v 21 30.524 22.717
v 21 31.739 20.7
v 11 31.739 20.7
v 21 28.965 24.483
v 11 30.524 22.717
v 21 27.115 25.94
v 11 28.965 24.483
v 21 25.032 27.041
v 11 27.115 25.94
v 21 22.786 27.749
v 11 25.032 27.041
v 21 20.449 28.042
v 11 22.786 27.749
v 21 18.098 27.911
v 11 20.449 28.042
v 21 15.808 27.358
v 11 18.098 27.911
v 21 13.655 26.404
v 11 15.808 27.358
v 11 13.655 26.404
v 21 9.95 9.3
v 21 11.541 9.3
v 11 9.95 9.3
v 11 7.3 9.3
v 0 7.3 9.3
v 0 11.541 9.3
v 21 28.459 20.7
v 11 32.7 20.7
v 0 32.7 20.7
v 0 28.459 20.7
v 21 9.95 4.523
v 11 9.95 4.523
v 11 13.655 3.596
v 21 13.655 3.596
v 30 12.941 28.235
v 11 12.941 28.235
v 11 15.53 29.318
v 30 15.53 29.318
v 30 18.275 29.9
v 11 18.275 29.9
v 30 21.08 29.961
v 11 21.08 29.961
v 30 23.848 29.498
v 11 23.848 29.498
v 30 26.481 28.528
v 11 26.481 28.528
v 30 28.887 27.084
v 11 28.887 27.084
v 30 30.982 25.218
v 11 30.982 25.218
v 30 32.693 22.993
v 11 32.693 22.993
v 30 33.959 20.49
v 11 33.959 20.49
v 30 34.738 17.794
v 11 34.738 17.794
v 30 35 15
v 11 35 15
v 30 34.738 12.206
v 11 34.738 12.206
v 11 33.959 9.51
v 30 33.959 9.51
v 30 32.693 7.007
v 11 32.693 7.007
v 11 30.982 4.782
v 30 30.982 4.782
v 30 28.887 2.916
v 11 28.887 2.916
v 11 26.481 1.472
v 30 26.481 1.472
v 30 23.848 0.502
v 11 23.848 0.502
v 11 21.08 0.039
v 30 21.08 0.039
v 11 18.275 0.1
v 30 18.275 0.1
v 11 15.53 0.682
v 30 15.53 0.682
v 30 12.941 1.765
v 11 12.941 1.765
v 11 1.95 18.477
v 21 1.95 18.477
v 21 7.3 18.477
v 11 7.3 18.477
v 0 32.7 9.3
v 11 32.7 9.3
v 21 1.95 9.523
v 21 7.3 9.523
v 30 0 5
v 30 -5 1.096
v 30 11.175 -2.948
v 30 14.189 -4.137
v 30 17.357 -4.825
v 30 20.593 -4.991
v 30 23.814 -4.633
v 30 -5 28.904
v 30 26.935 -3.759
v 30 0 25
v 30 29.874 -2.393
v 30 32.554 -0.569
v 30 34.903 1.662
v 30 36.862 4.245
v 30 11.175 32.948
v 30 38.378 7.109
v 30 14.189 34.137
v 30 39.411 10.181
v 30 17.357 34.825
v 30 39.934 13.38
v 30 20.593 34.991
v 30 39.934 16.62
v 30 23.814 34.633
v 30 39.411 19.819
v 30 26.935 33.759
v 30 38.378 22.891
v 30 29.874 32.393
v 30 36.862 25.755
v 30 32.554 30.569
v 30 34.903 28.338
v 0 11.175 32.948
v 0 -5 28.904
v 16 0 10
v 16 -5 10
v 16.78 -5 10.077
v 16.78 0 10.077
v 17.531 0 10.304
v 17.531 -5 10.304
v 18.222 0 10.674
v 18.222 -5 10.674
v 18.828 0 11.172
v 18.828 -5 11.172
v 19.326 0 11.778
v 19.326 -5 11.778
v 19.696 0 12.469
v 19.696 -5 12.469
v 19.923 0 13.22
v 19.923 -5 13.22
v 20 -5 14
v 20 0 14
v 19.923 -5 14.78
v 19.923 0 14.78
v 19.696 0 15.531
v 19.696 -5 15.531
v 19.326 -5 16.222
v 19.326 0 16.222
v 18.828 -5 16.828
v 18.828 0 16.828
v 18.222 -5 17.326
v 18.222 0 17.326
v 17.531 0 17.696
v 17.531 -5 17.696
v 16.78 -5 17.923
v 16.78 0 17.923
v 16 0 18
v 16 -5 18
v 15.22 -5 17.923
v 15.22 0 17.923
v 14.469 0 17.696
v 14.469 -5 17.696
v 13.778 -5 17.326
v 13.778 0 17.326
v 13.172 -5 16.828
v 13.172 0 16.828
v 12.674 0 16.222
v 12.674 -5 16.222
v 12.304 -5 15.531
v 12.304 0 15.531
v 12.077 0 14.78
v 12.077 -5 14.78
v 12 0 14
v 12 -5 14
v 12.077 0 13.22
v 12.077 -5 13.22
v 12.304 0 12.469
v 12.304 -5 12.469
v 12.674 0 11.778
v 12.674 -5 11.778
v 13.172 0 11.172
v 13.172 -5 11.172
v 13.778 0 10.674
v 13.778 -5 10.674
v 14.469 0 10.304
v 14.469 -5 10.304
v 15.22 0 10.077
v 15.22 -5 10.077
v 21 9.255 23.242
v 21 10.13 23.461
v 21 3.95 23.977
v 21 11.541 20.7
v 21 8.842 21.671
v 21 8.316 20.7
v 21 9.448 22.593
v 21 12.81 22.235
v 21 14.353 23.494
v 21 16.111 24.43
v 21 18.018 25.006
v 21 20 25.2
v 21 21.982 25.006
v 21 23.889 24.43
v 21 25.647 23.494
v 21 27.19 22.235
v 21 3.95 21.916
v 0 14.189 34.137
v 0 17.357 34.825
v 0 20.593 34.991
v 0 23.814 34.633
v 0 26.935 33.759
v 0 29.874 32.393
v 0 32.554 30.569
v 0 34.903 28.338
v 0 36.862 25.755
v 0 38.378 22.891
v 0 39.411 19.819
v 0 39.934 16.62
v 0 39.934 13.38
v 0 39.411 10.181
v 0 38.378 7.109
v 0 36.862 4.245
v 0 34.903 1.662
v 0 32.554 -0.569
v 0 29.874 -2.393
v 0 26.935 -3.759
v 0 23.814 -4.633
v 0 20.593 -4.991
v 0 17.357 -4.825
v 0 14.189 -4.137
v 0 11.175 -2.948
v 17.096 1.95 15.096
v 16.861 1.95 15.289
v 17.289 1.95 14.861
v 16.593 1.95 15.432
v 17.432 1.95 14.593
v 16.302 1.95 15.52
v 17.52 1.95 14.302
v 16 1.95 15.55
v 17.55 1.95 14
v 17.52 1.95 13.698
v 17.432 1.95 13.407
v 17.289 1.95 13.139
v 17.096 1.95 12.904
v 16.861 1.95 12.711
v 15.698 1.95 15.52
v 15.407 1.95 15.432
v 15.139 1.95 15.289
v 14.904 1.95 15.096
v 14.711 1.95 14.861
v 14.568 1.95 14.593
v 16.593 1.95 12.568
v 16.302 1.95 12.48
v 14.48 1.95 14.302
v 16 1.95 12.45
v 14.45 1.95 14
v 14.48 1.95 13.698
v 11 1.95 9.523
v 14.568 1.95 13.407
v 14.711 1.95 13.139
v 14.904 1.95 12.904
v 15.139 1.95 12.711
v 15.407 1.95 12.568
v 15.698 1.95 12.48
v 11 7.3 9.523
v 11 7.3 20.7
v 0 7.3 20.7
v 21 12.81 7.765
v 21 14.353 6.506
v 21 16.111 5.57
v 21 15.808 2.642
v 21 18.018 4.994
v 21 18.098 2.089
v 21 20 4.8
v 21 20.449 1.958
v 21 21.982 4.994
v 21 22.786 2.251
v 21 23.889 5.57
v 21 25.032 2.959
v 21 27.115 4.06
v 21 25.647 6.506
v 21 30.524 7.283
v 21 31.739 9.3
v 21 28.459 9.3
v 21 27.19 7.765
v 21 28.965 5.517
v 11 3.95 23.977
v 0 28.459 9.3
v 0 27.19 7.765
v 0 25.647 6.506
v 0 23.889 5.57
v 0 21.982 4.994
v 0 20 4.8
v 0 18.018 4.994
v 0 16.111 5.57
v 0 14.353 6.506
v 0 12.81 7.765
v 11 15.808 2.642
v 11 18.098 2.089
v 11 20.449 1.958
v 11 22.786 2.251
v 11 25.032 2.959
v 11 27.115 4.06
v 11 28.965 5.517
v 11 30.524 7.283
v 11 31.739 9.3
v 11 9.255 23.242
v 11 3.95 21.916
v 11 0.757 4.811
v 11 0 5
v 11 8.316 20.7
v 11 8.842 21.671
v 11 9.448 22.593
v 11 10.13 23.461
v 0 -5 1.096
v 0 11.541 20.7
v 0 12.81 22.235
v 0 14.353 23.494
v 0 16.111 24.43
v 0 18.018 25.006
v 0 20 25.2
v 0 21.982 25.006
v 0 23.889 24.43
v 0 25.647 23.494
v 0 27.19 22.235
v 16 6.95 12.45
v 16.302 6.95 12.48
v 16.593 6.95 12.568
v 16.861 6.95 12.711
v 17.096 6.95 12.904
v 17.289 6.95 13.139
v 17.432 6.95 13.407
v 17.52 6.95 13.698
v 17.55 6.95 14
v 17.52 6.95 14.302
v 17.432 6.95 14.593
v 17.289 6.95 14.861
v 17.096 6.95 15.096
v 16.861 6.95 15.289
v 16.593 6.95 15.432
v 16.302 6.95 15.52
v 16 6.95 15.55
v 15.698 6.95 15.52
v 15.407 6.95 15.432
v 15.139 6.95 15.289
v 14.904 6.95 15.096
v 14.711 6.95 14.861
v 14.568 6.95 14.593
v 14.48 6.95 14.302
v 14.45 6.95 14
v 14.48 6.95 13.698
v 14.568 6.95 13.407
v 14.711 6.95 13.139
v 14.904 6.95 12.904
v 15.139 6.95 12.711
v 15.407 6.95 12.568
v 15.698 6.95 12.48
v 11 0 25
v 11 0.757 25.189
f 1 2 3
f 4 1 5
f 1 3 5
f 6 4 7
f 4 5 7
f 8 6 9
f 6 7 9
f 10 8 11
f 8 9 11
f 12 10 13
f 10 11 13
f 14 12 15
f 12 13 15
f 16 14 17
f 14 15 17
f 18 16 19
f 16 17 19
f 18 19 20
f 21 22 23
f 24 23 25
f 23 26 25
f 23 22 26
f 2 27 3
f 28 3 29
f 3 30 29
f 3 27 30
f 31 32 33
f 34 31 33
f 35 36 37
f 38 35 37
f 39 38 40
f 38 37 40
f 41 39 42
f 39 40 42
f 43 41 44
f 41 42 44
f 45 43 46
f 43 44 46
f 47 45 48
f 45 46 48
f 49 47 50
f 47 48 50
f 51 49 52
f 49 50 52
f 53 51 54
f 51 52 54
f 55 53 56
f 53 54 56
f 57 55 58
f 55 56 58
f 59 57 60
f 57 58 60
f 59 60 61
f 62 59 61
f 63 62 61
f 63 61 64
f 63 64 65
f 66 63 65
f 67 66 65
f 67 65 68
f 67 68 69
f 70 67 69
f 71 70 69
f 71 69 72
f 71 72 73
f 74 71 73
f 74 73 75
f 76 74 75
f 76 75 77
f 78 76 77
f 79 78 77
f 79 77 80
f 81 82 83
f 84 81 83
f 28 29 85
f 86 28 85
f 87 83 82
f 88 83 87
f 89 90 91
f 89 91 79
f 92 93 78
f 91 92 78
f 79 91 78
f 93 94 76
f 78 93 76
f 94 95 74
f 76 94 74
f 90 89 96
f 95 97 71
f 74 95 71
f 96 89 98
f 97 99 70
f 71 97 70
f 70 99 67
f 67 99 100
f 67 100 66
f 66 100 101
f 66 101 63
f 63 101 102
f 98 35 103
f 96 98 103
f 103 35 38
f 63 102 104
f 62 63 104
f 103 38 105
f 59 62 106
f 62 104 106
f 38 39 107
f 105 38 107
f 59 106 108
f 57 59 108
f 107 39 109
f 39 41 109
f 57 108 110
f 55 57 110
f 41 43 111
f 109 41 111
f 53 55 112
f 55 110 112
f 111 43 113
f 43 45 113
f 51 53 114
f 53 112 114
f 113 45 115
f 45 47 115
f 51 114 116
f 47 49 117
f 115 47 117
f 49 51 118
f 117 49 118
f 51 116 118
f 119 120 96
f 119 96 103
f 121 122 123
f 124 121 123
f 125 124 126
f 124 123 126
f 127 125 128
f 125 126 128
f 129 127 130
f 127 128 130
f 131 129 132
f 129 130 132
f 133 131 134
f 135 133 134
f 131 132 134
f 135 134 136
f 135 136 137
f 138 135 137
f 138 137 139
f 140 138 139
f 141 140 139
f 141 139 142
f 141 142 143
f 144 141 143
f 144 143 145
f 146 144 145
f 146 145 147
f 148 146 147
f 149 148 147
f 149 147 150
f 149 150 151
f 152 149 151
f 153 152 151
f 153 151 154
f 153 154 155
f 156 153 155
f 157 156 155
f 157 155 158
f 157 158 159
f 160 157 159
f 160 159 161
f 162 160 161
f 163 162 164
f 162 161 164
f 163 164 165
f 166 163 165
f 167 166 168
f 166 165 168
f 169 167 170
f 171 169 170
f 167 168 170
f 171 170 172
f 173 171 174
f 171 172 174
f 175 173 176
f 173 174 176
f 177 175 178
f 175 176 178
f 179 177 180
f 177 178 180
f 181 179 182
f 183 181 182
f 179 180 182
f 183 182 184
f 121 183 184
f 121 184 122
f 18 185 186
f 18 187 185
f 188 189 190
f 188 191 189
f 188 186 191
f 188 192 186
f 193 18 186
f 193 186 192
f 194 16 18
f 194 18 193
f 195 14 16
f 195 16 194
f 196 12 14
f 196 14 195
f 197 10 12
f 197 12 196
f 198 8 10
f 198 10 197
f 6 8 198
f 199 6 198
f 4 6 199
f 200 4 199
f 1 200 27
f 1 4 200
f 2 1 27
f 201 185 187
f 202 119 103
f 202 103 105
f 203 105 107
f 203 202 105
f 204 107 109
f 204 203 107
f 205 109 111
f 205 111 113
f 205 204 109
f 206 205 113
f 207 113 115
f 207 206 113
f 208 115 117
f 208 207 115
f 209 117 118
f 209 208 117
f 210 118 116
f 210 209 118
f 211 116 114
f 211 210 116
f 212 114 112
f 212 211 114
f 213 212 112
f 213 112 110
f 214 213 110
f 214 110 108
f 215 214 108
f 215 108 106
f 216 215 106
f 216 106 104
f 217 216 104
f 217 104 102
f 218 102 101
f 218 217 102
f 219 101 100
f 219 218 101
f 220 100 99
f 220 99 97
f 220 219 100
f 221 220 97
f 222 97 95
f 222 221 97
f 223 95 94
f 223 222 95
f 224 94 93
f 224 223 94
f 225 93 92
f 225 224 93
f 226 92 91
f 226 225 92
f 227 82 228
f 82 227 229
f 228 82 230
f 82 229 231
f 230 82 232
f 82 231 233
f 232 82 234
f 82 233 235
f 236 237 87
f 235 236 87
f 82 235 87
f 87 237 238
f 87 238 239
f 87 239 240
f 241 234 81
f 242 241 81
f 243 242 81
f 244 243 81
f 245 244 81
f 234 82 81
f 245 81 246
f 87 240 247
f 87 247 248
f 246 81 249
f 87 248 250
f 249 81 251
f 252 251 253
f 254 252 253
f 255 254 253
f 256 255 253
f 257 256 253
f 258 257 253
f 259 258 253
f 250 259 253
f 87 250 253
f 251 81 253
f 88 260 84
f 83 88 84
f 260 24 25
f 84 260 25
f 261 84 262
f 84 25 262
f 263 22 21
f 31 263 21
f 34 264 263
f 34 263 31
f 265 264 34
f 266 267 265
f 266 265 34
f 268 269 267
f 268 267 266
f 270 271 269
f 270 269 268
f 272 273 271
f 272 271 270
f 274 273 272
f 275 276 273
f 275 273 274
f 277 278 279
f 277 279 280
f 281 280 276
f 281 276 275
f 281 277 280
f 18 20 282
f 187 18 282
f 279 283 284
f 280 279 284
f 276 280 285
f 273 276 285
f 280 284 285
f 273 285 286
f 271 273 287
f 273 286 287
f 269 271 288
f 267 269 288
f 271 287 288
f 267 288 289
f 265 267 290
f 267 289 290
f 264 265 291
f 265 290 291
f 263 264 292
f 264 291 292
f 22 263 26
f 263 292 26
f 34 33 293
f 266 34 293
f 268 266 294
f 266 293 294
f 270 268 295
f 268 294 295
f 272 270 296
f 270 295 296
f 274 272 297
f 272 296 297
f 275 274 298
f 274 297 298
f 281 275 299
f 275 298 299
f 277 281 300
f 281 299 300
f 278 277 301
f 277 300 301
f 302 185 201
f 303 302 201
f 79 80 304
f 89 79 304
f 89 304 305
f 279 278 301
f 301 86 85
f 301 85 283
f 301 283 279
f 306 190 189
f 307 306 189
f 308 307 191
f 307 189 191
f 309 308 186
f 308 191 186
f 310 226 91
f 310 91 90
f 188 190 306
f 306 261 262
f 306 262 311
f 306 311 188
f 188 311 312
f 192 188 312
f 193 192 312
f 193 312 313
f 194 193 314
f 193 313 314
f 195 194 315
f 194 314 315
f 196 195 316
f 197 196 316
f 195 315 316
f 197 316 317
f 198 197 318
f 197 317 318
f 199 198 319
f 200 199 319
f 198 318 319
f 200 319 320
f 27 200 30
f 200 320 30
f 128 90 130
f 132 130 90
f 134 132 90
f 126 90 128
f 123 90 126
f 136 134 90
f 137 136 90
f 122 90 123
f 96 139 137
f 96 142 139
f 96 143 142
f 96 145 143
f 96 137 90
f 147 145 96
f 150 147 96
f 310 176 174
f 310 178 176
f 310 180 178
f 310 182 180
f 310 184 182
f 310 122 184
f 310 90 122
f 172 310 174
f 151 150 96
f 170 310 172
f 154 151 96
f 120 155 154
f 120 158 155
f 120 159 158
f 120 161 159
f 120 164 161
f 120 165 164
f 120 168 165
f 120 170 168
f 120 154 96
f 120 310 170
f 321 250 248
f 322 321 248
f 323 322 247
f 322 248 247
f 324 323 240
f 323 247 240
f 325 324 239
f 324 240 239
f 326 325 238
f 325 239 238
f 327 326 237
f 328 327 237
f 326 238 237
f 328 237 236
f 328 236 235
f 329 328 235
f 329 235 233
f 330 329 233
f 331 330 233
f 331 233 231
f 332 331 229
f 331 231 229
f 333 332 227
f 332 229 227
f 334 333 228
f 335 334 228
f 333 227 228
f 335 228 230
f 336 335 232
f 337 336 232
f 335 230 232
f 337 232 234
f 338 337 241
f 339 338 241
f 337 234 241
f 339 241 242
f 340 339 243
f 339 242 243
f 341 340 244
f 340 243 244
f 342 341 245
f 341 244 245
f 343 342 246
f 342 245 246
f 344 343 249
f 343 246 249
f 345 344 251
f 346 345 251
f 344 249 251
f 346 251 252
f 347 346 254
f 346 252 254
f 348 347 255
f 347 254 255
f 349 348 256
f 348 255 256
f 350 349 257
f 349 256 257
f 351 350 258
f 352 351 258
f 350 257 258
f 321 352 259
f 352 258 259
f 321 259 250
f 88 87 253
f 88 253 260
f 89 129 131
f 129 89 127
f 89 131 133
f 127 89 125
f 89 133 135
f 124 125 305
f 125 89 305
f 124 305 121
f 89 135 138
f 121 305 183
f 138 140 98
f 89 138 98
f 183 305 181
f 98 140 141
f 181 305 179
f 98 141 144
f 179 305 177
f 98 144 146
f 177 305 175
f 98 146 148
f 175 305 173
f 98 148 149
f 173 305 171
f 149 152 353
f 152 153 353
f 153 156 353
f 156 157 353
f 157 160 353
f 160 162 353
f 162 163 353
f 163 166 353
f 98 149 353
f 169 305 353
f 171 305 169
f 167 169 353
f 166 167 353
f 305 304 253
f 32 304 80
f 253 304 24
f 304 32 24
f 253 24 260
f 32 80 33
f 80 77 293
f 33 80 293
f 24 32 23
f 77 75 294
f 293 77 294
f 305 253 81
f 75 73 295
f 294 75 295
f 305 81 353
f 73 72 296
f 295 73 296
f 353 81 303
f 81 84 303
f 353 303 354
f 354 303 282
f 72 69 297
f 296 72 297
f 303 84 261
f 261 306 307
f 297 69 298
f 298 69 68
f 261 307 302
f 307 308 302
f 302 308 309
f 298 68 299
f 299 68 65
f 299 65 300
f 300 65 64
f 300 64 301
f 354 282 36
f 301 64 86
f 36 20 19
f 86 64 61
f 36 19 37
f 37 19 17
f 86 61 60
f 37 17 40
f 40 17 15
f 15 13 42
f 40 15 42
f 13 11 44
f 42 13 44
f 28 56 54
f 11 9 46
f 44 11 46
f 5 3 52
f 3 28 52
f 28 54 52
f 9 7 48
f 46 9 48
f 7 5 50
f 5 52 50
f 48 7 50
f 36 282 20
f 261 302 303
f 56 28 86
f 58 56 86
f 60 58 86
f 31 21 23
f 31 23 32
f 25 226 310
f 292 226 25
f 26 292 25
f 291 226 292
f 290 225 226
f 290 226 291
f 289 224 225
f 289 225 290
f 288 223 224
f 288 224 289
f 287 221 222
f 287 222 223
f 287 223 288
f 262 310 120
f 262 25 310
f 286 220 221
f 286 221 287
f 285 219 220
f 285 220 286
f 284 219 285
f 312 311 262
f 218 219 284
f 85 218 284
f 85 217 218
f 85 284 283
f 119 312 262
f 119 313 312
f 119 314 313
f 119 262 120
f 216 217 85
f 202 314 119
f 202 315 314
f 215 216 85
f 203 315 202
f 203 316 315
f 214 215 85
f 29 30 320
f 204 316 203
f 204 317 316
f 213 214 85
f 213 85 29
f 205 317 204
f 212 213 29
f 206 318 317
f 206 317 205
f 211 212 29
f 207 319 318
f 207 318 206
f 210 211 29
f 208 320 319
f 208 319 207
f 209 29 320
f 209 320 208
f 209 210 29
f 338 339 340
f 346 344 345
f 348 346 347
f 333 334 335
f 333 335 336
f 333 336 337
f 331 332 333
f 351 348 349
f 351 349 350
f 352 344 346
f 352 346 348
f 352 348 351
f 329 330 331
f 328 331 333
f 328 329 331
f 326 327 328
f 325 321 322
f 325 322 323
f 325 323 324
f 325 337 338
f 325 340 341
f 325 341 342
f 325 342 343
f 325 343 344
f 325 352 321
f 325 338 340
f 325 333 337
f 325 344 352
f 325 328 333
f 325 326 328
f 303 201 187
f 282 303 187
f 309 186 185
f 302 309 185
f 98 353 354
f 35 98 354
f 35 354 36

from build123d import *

# Parameters (mm, degrees)
CROQUIS1_R              = 10
SALIENTE_EXTRUIR1_DEPTH = 11
CROQUIS2_R              = 10
SALIENTE_EXTRUIR2_DEPTH = 10
CORTAR_EXTRUIR3_DEPTH   = 10
CROQUIS8_R              = 1.55
CORTAR_EXTRUIR4_DEPTH   = 5
CORTAR_EXTRUIR5_REACH   = 52.656
CORTAR_EXTRUIR6_START   = -10
CORTAR_EXTRUIR6_DEPTH   = 10
SALIENTE_EXTRUIR3_DEPTH = 30
CORTAR_EXTRUIR7_REACH   = 66.42
CROQUIS14_R             = 4


with BuildPart() as part:
    # Croquis1 → Saliente-Extruir1 (new body)
    with BuildSketch(Plane(origin=(0, 0, 0), x_dir=(0, 0, -1), z_dir=(1, 0, 0))):
        with BuildLine():
            Line((-5.780776406, 0), (-24.219223594, 0))
            Line((-24.219223594, 0), (-25, 0))
            Line((-25, 0), (-25.189366094, 0.757464375))
            Line((-25.189366094, 0.757464375), (-28.235294118, 12.941176471))
            ThreePointArc((-28.235294118, 12.941176471), (-15, 35), (-1.764705882, 12.941176471))
            Line((-1.764705882, 12.941176471), (-4.810633906, 0.757464375))
            Line((-4.810633906, 0.757464375), (-5, 0))
            Line((-5, 0), (-5.780776406, 0))
        make_face()
        with Locations((-15, 20)):
            Circle(CROQUIS1_R, mode=Mode.SUBTRACT)
    extrude(amount=SALIENTE_EXTRUIR1_DEPTH)

    # Croquis2 → Saliente-Extruir2 (add)
    with BuildSketch(Plane(origin=(11, 0, 0), x_dir=(0, 0, -1), z_dir=(1, 0, 0))):
        with BuildLine():
            Line((-23.477486008, 1.95), (-6.522513992, 1.95))
            Line((-6.522513992, 1.95), (-3.59620246, 13.655246131))
            ThreePointArc((-3.59620246, 13.655246131), (-15, 33.05), (-26.40379754, 13.655246131))
            Line((-26.40379754, 13.655246131), (-23.477486008, 1.95))
        make_face()
        with Locations((-15, 20)):
            Circle(CROQUIS2_R, mode=Mode.SUBTRACT)
    extrude(amount=SALIENTE_EXTRUIR2_DEPTH)

    # Croquis3 → Cortar-Extruir3 (cut)
    with BuildSketch(Plane(origin=(21, 0, 0), x_dir=(0, 0, -1), z_dir=(1, 0, 0))):
        Polygon((-9.522513992, 1.95), (-9.522513992, 9.95), (-4.522513992, 9.95), (-6.522513992, 1.95), align=None)
        with BuildLine():
            Line((-23.477486008, 1.95), (-18.477486008, 1.95))
            Line((-18.477486008, 1.95), (-18.477486008, 6.945227656))
            Line((-18.477486008, 6.945227656), (-18.477486008, 7.473743933))
            ThreePointArc((-18.477486008, 7.473743933), (-21.115240601, 8.528128645), (-23.461002355, 10.130276643))
            Line((-23.461002355, 10.130276643), (-23.242071918, 9.254554893))
            Line((-23.242071918, 9.254554893), (-21.915933195, 3.95))
            Line((-21.915933195, 3.95), (-23.977486008, 3.95))
            Line((-23.977486008, 3.95), (-23.477486008, 1.95))
        make_face()
    extrude(amount=-CORTAR_EXTRUIR3_DEPTH, mode=Mode.SUBTRACT)

    # Croquis8 → Cortar-Extruir4 (cut)
    with BuildSketch(Plane.XZ.offset(-1.95)):
        with Locations(Location((16, 14, 0), (0, 0, 270))):
            Circle(CROQUIS8_R)
    extrude(amount=-CORTAR_EXTRUIR4_DEPTH, mode=Mode.SUBTRACT)

    # Cortar-Extruir5: up to this face of the body (flat: up to its plane)
    cortar_extruir5_end = Plane(part.part.faces().sort_by_distance((21, 32.643992611, 15))[0])
    # Croquis11 → Cortar-Extruir5 (cut, up to the picked face)
    with BuildSketch(Plane.ZY, mode=Mode.PRIVATE) as cortar_extruir5_sk1:
        with BuildLine():
            Line((20.7, 32.7), (9.3, 32.7))
            Line((9.3, 32.7), (9.3, 28.458723308))
            ThreePointArc((9.3, 28.458723308), (4.8, 20), (9.3, 11.541276692))
            Line((9.3, 11.541276692), (9.3, 7.3))
            Line((9.3, 7.3), (20.7, 7.3))
            Line((20.7, 7.3), (20.7, 11.541276692))
            ThreePointArc((20.7, 11.541276692), (25.2, 20), (20.7, 28.458723308))
            Line((20.7, 28.458723308), (20.7, 32.7))
        make_face()
    cortar_extruir5_tool1 = split(extrude(cortar_extruir5_sk1.sketch, amount=-CORTAR_EXTRUIR5_REACH, mode=Mode.PRIVATE), bisect_by=cortar_extruir5_end, keep=Keep.BOTH, mode=Mode.PRIVATE)
    add(cortar_extruir5_tool1.solids().sort_by(Axis((0, 20, 15), (1, 0, 0)))[0], mode=Mode.SUBTRACT)

    # Croquis12 → Cortar-Extruir6 (cut)
    with BuildSketch(Plane(origin=(21, 0, 0), x_dir=(0, 0, -1), z_dir=(1, 0, 0)).offset(CORTAR_EXTRUIR6_START)):
        with BuildLine():
            Line((-18.00208261, 32.7), (-11.99791739, 32.7))
            ThreePointArc((-11.99791739, 32.7), (-15, 33.05), (-18.00208261, 32.7))
        make_face()
    extrude(amount=CORTAR_EXTRUIR6_DEPTH, mode=Mode.SUBTRACT)

    # Croquis13 → Saliente-Extruir3 (add)
    with BuildSketch(Plane.ZY):
        with BuildLine():
            Line((1.096117968, -5), (28.903882032, -5))
            Line((28.903882032, -5), (32.947577878, 11.174783385))
            ThreePointArc((32.947577878, 11.174783385), (15, 40), (-2.947577878, 11.174783385))
            Line((-2.947577878, 11.174783385), (1.096117968, -5))
        make_face()
        with BuildLine():
            Line((5, 0), (25, 0))
            Line((25, 0), (28.235294118, 12.941176471))
            ThreePointArc((28.235294118, 12.941176471), (15, 35), (1.764705882, 12.941176471))
            Line((1.764705882, 12.941176471), (5, 0))
        make_face(mode=Mode.SUBTRACT)
    extrude(amount=-SALIENTE_EXTRUIR3_DEPTH)

    # Croquis14 → Cortar-Extruir7 (cut, up to next)
    with BuildSketch(Plane.XZ.offset(5), mode=Mode.PRIVATE) as cortar_extruir7_sk1:
        with Locations(Location((16, 14, 0), (0, 0, 270))):
            Circle(CROQUIS14_R)
    cortar_extruir7_tool1 = extrude(cortar_extruir7_sk1.sketch, amount=-CORTAR_EXTRUIR7_REACH, mode=Mode.PRIVATE) & part.part
    add(cortar_extruir7_tool1.solids().sort_by_distance((16, -5, 14))[0], mode=Mode.SUBTRACT)


solid = part.part
